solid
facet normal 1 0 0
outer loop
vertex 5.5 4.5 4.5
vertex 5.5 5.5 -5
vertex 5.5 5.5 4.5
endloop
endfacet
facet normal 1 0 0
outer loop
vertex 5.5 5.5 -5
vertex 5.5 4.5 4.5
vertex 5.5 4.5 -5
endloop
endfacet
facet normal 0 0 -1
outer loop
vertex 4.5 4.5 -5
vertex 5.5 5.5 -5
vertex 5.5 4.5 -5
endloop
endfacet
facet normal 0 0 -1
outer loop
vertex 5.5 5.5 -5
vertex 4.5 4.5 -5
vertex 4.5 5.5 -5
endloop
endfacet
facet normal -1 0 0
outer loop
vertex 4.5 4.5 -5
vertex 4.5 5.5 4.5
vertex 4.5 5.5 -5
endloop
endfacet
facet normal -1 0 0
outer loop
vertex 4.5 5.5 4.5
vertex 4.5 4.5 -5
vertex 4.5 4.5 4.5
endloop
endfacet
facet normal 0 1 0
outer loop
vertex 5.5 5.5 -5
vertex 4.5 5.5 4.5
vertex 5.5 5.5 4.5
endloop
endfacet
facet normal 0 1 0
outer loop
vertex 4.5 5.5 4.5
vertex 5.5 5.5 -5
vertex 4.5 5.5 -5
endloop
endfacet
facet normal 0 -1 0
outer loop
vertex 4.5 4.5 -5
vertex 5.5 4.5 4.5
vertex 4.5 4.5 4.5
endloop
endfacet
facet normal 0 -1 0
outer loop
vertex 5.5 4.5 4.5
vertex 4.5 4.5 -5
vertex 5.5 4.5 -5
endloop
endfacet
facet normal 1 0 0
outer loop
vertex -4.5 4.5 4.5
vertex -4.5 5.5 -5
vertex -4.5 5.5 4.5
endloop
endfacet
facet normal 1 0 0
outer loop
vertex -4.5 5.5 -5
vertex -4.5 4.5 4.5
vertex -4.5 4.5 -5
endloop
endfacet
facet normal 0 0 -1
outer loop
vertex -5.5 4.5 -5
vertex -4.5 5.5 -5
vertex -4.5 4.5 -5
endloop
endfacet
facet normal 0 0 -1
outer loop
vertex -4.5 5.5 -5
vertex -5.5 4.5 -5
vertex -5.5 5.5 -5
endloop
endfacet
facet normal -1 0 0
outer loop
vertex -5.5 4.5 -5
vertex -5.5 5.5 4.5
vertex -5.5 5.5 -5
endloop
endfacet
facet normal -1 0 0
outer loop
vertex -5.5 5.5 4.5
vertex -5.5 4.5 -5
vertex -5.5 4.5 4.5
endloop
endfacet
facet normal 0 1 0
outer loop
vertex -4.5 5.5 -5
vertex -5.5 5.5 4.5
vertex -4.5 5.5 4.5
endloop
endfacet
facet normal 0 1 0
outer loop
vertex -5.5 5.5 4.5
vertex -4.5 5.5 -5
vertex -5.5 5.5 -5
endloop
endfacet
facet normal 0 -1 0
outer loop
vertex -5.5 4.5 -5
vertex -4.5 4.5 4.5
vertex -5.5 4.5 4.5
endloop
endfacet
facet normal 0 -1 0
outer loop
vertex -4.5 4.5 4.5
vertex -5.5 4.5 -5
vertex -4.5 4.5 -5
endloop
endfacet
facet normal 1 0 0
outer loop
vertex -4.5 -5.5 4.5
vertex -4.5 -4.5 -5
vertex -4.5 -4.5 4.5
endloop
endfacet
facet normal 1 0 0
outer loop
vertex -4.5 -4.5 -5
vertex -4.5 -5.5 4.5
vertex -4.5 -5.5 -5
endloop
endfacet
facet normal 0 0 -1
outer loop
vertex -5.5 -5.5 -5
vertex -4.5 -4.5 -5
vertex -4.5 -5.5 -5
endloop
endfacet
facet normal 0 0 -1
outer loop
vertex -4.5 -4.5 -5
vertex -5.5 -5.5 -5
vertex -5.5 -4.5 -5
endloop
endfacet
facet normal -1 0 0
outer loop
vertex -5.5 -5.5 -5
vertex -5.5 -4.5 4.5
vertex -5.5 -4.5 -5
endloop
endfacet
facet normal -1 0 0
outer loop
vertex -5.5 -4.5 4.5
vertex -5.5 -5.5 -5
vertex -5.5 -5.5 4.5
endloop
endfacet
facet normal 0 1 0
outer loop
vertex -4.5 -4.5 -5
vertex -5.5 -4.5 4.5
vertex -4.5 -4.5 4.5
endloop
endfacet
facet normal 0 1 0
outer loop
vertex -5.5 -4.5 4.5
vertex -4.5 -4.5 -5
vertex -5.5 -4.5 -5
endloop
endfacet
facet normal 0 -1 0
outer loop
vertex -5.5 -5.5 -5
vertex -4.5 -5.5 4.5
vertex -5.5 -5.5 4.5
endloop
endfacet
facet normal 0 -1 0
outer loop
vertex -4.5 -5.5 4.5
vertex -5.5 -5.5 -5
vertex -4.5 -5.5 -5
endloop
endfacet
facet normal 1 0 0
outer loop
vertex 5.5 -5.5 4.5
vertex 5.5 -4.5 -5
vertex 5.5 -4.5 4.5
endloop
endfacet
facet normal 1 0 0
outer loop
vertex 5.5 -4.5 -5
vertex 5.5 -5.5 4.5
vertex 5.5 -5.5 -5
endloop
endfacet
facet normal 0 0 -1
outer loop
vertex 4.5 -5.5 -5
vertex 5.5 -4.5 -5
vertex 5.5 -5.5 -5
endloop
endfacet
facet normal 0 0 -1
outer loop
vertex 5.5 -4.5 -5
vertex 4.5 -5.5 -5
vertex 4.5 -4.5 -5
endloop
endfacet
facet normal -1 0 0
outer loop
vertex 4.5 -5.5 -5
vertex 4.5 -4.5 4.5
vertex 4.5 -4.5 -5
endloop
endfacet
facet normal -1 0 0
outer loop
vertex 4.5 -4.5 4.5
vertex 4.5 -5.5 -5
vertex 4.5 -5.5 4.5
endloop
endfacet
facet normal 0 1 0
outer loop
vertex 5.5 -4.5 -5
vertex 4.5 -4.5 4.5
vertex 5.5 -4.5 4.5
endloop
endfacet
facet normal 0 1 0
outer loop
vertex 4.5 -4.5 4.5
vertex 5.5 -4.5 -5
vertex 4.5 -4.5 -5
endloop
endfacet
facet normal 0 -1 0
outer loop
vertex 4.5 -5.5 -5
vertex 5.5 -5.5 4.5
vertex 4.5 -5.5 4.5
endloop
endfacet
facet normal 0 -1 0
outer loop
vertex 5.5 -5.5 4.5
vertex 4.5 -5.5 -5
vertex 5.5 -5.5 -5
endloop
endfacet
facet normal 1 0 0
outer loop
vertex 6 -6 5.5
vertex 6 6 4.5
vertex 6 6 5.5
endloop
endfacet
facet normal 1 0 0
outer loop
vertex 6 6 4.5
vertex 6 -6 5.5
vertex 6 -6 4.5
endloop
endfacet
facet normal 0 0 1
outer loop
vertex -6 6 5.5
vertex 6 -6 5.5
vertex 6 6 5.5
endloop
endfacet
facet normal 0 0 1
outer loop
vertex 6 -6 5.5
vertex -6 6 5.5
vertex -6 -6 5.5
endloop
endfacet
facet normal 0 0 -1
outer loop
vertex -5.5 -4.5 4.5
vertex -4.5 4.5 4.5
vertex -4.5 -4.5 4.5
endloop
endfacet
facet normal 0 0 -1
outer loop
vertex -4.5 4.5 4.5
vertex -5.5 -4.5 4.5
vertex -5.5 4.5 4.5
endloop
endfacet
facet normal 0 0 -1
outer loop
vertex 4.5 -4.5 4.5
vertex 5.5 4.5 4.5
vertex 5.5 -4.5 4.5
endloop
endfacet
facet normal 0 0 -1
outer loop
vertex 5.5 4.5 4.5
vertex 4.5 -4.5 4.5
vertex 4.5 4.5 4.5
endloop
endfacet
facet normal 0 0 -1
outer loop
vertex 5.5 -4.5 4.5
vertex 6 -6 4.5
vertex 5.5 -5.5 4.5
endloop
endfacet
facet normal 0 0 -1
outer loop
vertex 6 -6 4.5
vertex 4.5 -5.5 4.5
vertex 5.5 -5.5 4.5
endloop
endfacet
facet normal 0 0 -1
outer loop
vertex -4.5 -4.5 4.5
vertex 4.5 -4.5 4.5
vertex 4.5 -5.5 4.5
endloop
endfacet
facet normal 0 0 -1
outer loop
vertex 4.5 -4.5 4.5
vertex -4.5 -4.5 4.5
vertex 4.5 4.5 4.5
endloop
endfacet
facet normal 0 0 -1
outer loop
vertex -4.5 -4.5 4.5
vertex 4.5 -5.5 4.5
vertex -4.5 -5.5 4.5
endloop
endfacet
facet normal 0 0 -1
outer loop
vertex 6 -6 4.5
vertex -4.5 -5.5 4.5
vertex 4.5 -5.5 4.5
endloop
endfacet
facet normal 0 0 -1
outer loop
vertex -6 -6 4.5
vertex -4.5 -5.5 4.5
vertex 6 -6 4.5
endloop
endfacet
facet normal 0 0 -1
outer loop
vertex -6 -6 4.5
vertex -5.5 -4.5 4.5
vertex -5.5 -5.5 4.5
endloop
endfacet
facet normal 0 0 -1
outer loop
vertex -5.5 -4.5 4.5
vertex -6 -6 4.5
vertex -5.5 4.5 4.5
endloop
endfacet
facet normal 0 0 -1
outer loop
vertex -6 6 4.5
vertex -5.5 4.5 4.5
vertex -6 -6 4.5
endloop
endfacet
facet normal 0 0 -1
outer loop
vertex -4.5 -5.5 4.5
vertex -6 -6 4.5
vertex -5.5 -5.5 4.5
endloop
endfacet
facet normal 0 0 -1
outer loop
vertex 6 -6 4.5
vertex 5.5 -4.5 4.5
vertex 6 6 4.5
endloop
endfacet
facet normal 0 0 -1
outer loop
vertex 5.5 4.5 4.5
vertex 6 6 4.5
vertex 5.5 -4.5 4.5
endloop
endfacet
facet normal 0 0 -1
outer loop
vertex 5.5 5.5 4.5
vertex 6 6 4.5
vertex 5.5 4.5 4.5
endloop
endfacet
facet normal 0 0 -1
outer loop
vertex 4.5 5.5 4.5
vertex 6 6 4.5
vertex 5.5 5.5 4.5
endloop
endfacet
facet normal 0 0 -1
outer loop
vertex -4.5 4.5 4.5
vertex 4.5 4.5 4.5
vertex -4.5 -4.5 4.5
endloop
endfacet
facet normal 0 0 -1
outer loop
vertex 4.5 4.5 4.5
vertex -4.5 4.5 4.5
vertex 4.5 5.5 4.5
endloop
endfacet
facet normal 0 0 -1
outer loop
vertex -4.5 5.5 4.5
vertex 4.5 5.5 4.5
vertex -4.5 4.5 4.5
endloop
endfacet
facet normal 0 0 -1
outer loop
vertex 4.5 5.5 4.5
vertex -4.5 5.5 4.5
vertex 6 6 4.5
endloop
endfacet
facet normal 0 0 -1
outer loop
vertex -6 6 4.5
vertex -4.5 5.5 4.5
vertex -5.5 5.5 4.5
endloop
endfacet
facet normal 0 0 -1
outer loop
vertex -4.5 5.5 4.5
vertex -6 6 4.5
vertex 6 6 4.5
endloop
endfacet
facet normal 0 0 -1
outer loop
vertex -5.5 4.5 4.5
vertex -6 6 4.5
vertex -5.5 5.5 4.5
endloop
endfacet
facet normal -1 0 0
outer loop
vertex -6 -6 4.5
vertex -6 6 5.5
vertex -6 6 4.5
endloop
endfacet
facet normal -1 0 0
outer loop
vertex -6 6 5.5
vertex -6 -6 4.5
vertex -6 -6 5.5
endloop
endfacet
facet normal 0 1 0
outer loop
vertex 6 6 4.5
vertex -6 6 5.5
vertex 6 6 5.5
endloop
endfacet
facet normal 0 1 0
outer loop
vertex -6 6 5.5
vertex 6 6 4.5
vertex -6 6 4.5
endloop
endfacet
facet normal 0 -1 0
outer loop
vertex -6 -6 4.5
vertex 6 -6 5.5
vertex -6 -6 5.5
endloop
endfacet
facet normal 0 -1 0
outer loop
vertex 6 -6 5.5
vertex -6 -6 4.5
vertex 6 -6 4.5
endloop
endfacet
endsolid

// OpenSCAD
// Angelo Nicolì 2023 - Licensed GPL-2.0

Table_Leg = [1,1,10];
Table_Upper = [12,12,1];


translate([5,5,0])
cube([Table_Leg[0],Table_Leg[1],Table_Leg[2]],center=true);

translate([-5,5,0])
cube([Table_Leg[0],Table_Leg[1],Table_Leg[2]],center=true);

translate([-5,-5,0])
cube([Table_Leg[0],Table_Leg[1],Table_Leg[2]],center=true);

translate([5,-5,0])
cube([Table_Leg[0],Table_Leg[1],Table_Leg[2]],center=true);

translate([0,0,5])
cube([Table_Upper[0],Table_Upper[1],Table_Upper[2]],center=true);
